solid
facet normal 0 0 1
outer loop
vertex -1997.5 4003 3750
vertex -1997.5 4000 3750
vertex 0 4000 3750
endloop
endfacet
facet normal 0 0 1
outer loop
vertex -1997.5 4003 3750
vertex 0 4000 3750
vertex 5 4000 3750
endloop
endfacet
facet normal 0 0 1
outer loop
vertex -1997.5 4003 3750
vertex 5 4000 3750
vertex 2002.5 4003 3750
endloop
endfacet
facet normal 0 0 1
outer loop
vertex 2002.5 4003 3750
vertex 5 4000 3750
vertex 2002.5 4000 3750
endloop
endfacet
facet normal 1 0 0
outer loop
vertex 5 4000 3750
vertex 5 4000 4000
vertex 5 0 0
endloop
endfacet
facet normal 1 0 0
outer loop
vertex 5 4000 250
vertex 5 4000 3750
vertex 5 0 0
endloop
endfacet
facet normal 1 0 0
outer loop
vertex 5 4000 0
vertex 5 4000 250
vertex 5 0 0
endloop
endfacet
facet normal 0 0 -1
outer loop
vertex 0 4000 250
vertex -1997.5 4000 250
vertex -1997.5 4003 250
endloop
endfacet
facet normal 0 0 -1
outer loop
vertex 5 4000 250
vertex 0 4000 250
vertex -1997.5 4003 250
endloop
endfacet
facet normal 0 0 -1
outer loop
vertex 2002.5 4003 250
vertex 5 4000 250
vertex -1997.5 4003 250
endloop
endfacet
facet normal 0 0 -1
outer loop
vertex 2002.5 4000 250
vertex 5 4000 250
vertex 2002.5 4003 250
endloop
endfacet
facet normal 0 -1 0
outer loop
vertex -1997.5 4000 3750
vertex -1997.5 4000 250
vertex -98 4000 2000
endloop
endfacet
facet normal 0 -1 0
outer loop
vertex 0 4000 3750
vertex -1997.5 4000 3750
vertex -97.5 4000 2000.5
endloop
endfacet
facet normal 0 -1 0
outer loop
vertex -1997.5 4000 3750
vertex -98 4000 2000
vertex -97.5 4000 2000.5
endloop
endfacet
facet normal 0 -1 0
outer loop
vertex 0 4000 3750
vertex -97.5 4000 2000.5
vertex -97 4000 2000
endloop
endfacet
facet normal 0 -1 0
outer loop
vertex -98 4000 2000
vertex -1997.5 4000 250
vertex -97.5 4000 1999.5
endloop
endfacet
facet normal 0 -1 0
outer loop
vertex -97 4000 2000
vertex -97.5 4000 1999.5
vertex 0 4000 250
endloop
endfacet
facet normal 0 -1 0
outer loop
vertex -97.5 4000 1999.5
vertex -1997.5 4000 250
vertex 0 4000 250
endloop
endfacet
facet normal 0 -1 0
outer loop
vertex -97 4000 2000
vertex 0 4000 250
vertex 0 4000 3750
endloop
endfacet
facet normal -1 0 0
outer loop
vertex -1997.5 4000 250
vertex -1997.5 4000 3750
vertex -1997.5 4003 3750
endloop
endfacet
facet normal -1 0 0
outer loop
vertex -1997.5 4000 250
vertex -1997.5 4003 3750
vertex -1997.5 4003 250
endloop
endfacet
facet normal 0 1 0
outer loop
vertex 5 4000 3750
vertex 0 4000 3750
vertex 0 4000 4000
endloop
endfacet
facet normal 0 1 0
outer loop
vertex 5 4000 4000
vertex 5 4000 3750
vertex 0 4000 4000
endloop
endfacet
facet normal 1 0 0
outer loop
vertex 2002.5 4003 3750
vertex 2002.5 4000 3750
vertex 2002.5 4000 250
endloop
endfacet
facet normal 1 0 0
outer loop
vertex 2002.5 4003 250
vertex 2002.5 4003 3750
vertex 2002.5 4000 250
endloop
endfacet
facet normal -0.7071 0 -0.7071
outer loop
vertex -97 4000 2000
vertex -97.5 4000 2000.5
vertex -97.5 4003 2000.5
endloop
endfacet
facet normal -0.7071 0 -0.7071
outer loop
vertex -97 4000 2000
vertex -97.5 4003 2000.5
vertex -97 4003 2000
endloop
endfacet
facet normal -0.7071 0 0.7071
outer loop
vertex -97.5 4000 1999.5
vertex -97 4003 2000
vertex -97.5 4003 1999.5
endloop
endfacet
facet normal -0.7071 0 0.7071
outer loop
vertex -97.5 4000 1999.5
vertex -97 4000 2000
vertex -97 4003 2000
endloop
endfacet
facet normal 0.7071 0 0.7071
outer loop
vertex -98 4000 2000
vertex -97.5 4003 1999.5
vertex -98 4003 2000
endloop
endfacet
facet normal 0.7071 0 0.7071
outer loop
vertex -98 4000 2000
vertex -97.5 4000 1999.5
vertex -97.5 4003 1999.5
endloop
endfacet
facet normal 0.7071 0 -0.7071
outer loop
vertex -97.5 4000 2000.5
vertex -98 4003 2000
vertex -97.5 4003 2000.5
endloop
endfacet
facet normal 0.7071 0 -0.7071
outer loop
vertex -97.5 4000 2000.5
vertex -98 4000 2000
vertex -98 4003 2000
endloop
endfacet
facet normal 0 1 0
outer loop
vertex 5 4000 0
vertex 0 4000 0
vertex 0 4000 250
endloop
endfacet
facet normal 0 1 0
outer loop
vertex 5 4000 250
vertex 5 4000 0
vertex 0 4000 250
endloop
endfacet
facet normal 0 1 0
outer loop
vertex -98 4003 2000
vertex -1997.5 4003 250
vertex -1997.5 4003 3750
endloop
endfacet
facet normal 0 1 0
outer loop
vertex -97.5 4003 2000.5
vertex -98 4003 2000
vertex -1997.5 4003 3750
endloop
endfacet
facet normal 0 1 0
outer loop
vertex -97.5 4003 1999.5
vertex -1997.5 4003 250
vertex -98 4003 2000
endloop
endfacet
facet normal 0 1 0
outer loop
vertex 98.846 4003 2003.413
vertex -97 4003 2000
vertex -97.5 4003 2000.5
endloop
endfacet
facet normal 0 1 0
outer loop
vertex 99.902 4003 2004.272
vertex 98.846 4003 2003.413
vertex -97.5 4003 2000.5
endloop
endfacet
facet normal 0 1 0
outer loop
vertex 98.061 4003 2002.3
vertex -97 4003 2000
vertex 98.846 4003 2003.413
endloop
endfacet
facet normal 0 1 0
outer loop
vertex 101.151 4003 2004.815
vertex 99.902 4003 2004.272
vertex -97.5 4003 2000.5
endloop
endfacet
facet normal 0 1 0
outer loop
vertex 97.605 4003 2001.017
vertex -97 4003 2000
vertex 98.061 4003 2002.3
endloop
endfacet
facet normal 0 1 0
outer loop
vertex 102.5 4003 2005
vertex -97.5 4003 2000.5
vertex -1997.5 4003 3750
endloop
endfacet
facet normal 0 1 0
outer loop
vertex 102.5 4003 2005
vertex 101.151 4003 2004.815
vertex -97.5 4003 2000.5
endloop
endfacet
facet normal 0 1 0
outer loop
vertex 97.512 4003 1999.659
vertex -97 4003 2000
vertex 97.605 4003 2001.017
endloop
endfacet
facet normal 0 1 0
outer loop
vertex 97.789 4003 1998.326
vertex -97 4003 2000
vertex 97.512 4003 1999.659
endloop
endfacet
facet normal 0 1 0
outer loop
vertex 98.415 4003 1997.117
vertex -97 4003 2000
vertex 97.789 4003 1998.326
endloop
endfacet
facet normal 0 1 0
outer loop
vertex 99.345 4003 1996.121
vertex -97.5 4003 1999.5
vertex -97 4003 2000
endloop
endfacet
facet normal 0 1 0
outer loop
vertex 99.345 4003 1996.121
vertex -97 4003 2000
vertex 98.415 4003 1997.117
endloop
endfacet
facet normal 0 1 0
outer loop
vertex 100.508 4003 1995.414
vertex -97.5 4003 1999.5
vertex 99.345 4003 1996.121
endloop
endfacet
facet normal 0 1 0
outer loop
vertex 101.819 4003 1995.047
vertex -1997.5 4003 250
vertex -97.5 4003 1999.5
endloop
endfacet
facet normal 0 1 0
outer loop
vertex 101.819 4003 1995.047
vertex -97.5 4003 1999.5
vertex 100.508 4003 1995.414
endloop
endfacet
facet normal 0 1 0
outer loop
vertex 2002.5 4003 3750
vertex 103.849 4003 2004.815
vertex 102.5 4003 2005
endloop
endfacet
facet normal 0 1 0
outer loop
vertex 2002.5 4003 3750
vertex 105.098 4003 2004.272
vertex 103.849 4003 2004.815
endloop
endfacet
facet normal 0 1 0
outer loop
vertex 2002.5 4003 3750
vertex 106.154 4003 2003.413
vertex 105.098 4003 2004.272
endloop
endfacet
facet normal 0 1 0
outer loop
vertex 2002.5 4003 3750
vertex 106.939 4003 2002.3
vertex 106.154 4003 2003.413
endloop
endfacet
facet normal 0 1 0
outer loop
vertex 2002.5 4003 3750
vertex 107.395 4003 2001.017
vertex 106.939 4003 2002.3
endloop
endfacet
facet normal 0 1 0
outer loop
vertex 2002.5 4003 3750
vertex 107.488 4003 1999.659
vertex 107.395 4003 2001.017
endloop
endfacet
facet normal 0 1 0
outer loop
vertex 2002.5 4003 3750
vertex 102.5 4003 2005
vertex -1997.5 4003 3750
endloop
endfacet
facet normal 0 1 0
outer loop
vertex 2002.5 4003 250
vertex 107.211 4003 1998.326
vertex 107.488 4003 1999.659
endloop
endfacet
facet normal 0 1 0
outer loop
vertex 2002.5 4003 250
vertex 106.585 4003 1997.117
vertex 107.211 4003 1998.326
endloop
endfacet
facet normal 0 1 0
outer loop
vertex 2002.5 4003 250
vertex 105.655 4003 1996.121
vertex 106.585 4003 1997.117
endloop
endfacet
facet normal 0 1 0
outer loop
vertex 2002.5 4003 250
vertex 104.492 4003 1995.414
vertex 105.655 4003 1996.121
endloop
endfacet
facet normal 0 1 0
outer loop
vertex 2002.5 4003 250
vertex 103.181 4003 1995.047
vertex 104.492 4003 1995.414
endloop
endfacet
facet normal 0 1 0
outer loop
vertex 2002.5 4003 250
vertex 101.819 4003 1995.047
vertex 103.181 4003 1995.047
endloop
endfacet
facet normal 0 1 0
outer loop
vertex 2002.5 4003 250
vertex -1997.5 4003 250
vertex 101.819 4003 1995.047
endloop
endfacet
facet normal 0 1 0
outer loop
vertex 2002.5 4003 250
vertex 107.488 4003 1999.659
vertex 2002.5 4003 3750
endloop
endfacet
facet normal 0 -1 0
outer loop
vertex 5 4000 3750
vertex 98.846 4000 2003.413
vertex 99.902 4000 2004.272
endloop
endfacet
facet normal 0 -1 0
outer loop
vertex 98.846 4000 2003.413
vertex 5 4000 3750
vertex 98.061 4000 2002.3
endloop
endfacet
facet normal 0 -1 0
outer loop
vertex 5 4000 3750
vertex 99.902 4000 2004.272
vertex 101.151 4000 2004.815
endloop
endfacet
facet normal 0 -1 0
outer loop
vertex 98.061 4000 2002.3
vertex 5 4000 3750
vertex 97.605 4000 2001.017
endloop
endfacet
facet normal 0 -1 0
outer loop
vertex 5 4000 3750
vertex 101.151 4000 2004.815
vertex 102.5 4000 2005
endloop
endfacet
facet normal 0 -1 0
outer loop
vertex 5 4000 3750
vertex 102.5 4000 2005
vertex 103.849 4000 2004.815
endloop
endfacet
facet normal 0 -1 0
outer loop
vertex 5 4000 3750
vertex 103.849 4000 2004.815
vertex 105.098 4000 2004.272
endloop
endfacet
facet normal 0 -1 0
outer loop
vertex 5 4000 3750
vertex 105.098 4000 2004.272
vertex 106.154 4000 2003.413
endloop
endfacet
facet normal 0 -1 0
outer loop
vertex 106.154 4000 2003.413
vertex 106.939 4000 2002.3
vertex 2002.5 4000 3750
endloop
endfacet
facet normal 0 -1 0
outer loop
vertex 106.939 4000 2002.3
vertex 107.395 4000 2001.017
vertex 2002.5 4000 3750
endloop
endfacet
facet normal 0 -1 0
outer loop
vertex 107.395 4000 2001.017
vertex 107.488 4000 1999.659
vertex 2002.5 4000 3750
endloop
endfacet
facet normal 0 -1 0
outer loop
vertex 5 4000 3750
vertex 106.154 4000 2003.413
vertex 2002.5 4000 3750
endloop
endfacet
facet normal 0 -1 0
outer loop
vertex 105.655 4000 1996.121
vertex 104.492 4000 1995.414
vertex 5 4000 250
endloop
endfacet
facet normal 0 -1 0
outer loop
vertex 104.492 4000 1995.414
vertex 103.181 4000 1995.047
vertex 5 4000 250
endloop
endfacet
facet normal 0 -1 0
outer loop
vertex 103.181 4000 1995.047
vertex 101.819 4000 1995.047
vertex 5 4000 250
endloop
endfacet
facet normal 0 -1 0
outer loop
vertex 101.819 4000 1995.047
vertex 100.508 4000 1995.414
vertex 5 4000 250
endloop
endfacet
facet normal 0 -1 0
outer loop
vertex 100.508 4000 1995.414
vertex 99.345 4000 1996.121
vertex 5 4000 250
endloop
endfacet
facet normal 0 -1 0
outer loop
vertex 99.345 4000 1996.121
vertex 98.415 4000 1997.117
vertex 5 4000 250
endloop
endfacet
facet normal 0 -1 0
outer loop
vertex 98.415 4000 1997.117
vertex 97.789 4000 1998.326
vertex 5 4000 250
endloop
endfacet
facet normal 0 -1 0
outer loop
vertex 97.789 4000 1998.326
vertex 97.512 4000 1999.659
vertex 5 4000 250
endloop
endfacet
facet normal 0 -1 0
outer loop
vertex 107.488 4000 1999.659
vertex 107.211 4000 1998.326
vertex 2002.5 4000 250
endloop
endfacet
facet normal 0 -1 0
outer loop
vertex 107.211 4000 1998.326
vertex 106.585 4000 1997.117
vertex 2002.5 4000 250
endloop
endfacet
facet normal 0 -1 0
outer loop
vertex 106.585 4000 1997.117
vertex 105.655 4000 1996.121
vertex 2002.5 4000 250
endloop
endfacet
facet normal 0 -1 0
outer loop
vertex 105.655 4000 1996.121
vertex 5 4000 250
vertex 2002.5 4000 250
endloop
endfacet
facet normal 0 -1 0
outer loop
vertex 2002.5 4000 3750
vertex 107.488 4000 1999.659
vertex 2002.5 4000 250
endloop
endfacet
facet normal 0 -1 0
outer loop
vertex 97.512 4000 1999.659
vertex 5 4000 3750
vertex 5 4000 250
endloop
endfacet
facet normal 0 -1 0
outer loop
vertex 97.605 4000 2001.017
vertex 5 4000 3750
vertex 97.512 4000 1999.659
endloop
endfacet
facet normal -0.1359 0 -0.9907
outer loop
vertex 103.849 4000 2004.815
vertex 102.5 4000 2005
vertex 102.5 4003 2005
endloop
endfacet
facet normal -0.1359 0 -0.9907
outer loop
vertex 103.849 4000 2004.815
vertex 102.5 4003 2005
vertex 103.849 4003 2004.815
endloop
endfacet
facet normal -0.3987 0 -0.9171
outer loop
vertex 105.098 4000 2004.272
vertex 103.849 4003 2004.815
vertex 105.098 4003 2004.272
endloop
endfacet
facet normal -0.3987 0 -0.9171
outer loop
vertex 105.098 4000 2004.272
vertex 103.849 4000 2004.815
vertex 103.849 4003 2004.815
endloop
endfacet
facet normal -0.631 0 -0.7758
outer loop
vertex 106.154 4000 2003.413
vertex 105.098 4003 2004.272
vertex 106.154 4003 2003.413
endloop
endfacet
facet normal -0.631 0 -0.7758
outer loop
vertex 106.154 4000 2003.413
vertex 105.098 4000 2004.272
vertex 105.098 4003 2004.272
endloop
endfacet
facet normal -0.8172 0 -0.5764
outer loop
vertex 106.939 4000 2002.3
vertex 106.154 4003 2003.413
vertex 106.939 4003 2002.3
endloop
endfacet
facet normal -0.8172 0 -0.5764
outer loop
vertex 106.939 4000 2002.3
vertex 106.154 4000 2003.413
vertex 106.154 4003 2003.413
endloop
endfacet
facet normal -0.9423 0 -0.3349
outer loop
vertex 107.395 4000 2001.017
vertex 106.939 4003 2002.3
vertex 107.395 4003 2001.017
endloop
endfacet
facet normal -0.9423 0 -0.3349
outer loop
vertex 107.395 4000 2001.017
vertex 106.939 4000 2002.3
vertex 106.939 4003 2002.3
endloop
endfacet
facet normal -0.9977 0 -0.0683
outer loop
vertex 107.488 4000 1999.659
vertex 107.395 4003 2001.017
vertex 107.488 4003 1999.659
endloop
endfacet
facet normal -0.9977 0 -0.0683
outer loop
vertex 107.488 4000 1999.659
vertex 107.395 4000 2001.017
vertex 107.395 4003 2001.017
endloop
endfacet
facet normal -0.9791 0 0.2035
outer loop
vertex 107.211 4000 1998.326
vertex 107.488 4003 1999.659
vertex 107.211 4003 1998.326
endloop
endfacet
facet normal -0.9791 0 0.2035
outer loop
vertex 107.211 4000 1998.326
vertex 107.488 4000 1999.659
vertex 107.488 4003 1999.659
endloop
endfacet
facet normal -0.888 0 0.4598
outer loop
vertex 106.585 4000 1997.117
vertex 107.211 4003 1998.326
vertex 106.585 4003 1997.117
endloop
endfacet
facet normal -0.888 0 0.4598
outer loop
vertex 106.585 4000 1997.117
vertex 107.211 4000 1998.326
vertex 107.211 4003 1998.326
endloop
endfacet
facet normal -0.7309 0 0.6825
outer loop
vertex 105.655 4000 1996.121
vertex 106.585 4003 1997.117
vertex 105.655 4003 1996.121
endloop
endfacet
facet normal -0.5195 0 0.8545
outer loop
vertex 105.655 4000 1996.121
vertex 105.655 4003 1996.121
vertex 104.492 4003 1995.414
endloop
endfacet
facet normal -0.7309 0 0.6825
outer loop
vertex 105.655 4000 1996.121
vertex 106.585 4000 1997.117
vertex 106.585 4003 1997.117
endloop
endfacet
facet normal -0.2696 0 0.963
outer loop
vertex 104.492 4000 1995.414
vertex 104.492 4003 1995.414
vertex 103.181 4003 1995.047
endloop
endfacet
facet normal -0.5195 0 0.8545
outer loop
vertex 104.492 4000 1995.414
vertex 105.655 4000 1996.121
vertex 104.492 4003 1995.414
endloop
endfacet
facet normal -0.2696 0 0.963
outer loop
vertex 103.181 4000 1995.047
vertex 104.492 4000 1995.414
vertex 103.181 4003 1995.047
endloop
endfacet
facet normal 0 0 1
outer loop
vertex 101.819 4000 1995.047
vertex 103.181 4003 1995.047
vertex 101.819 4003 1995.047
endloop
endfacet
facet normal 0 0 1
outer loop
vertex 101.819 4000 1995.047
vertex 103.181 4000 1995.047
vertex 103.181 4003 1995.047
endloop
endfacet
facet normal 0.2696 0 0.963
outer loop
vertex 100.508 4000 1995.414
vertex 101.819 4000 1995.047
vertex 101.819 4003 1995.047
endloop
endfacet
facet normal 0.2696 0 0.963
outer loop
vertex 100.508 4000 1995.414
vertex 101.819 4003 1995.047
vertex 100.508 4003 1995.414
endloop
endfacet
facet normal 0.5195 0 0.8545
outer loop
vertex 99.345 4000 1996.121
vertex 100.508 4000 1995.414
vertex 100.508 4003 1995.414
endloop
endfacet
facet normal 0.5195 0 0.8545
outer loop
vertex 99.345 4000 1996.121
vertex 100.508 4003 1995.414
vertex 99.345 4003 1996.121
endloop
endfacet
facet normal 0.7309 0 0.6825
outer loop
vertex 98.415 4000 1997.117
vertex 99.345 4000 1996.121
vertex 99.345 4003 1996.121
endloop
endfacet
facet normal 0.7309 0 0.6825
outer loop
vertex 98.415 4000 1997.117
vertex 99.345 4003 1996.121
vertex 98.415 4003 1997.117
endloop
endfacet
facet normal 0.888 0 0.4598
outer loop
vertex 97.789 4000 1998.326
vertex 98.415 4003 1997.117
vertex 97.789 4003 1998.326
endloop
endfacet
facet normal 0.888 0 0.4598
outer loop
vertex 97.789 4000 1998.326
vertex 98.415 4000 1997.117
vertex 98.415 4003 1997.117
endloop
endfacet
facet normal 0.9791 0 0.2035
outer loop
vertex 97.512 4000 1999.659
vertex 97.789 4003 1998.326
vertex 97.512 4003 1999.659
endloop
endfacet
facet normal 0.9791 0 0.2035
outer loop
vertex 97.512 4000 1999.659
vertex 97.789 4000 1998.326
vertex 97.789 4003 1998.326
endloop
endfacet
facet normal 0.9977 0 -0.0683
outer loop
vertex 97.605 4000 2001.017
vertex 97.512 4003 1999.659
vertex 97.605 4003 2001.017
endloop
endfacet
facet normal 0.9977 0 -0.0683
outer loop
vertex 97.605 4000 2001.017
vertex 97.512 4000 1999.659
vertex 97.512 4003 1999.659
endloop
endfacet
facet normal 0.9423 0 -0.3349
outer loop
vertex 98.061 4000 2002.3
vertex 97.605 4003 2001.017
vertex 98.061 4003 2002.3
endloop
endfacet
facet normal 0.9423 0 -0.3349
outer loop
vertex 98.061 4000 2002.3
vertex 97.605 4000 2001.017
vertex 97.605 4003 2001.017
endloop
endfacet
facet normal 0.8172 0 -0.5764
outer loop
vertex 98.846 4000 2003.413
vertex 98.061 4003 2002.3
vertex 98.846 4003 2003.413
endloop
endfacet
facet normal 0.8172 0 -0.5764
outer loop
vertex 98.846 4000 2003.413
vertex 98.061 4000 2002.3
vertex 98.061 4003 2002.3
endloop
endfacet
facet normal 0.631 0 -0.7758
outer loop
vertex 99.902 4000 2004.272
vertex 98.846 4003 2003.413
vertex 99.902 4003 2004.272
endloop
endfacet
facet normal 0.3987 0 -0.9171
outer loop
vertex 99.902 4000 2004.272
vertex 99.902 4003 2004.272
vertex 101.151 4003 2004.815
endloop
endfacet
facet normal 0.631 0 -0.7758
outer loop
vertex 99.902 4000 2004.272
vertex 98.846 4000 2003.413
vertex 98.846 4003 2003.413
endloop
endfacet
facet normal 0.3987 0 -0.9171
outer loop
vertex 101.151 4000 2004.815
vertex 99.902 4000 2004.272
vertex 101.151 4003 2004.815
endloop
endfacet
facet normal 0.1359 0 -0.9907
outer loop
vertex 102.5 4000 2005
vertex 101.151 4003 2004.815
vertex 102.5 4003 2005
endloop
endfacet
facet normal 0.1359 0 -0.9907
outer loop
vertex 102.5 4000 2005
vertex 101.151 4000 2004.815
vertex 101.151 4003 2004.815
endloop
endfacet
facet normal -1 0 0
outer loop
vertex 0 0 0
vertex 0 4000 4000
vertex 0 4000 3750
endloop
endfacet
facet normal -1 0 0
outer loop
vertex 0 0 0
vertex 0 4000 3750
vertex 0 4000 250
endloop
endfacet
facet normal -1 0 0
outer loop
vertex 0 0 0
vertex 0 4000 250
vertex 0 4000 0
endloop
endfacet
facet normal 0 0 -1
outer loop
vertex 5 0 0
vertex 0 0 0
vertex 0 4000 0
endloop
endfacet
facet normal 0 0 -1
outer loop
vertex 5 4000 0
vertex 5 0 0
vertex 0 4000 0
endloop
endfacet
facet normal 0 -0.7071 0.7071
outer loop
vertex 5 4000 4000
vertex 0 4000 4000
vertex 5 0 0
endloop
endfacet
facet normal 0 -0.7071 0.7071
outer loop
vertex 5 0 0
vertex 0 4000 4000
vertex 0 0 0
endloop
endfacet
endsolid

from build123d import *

# Parameters (mm, degrees)
EXTRUDE_1_DEPTH = 5
SKETCH_2_W      = 4000
SKETCH_2_H      = 3500
SKETCH_2_R      = 0.5
SKETCH_2_R_2    = 5
EXTRUDE_2_DEPTH = 3


with BuildPart() as part:
    # Эскиз1 → Бобышка-Вытянуть1 (new body)
    with BuildSketch(Plane(origin=(0, 0, 0), x_dir=(0, 0, -1), z_dir=(1, 0, 0))):
        Polygon((-4000, 4000), (0, 0), (0, 4000), align=None)
    extrude(amount=EXTRUDE_1_DEPTH)

    # Эскиз2 → Бобышка-Вытянуть2 (add)
    with BuildSketch(Plane(origin=(0, 4000, 0), x_dir=(1, 0, 0), z_dir=(0, 1, 0))):
        with Locations((2.5, -2000)):
            Rectangle(SKETCH_2_W, SKETCH_2_H)
        with Locations(Location((-97.5, -2000, 0), (0, 0, 270))):
            Circle(SKETCH_2_R, mode=Mode.SUBTRACT)
        with Locations(Location((102.5, -2000, 0), (0, 0, 270))):
            Circle(SKETCH_2_R_2, mode=Mode.SUBTRACT)
    extrude(amount=EXTRUDE_2_DEPTH)


solid = part.part
